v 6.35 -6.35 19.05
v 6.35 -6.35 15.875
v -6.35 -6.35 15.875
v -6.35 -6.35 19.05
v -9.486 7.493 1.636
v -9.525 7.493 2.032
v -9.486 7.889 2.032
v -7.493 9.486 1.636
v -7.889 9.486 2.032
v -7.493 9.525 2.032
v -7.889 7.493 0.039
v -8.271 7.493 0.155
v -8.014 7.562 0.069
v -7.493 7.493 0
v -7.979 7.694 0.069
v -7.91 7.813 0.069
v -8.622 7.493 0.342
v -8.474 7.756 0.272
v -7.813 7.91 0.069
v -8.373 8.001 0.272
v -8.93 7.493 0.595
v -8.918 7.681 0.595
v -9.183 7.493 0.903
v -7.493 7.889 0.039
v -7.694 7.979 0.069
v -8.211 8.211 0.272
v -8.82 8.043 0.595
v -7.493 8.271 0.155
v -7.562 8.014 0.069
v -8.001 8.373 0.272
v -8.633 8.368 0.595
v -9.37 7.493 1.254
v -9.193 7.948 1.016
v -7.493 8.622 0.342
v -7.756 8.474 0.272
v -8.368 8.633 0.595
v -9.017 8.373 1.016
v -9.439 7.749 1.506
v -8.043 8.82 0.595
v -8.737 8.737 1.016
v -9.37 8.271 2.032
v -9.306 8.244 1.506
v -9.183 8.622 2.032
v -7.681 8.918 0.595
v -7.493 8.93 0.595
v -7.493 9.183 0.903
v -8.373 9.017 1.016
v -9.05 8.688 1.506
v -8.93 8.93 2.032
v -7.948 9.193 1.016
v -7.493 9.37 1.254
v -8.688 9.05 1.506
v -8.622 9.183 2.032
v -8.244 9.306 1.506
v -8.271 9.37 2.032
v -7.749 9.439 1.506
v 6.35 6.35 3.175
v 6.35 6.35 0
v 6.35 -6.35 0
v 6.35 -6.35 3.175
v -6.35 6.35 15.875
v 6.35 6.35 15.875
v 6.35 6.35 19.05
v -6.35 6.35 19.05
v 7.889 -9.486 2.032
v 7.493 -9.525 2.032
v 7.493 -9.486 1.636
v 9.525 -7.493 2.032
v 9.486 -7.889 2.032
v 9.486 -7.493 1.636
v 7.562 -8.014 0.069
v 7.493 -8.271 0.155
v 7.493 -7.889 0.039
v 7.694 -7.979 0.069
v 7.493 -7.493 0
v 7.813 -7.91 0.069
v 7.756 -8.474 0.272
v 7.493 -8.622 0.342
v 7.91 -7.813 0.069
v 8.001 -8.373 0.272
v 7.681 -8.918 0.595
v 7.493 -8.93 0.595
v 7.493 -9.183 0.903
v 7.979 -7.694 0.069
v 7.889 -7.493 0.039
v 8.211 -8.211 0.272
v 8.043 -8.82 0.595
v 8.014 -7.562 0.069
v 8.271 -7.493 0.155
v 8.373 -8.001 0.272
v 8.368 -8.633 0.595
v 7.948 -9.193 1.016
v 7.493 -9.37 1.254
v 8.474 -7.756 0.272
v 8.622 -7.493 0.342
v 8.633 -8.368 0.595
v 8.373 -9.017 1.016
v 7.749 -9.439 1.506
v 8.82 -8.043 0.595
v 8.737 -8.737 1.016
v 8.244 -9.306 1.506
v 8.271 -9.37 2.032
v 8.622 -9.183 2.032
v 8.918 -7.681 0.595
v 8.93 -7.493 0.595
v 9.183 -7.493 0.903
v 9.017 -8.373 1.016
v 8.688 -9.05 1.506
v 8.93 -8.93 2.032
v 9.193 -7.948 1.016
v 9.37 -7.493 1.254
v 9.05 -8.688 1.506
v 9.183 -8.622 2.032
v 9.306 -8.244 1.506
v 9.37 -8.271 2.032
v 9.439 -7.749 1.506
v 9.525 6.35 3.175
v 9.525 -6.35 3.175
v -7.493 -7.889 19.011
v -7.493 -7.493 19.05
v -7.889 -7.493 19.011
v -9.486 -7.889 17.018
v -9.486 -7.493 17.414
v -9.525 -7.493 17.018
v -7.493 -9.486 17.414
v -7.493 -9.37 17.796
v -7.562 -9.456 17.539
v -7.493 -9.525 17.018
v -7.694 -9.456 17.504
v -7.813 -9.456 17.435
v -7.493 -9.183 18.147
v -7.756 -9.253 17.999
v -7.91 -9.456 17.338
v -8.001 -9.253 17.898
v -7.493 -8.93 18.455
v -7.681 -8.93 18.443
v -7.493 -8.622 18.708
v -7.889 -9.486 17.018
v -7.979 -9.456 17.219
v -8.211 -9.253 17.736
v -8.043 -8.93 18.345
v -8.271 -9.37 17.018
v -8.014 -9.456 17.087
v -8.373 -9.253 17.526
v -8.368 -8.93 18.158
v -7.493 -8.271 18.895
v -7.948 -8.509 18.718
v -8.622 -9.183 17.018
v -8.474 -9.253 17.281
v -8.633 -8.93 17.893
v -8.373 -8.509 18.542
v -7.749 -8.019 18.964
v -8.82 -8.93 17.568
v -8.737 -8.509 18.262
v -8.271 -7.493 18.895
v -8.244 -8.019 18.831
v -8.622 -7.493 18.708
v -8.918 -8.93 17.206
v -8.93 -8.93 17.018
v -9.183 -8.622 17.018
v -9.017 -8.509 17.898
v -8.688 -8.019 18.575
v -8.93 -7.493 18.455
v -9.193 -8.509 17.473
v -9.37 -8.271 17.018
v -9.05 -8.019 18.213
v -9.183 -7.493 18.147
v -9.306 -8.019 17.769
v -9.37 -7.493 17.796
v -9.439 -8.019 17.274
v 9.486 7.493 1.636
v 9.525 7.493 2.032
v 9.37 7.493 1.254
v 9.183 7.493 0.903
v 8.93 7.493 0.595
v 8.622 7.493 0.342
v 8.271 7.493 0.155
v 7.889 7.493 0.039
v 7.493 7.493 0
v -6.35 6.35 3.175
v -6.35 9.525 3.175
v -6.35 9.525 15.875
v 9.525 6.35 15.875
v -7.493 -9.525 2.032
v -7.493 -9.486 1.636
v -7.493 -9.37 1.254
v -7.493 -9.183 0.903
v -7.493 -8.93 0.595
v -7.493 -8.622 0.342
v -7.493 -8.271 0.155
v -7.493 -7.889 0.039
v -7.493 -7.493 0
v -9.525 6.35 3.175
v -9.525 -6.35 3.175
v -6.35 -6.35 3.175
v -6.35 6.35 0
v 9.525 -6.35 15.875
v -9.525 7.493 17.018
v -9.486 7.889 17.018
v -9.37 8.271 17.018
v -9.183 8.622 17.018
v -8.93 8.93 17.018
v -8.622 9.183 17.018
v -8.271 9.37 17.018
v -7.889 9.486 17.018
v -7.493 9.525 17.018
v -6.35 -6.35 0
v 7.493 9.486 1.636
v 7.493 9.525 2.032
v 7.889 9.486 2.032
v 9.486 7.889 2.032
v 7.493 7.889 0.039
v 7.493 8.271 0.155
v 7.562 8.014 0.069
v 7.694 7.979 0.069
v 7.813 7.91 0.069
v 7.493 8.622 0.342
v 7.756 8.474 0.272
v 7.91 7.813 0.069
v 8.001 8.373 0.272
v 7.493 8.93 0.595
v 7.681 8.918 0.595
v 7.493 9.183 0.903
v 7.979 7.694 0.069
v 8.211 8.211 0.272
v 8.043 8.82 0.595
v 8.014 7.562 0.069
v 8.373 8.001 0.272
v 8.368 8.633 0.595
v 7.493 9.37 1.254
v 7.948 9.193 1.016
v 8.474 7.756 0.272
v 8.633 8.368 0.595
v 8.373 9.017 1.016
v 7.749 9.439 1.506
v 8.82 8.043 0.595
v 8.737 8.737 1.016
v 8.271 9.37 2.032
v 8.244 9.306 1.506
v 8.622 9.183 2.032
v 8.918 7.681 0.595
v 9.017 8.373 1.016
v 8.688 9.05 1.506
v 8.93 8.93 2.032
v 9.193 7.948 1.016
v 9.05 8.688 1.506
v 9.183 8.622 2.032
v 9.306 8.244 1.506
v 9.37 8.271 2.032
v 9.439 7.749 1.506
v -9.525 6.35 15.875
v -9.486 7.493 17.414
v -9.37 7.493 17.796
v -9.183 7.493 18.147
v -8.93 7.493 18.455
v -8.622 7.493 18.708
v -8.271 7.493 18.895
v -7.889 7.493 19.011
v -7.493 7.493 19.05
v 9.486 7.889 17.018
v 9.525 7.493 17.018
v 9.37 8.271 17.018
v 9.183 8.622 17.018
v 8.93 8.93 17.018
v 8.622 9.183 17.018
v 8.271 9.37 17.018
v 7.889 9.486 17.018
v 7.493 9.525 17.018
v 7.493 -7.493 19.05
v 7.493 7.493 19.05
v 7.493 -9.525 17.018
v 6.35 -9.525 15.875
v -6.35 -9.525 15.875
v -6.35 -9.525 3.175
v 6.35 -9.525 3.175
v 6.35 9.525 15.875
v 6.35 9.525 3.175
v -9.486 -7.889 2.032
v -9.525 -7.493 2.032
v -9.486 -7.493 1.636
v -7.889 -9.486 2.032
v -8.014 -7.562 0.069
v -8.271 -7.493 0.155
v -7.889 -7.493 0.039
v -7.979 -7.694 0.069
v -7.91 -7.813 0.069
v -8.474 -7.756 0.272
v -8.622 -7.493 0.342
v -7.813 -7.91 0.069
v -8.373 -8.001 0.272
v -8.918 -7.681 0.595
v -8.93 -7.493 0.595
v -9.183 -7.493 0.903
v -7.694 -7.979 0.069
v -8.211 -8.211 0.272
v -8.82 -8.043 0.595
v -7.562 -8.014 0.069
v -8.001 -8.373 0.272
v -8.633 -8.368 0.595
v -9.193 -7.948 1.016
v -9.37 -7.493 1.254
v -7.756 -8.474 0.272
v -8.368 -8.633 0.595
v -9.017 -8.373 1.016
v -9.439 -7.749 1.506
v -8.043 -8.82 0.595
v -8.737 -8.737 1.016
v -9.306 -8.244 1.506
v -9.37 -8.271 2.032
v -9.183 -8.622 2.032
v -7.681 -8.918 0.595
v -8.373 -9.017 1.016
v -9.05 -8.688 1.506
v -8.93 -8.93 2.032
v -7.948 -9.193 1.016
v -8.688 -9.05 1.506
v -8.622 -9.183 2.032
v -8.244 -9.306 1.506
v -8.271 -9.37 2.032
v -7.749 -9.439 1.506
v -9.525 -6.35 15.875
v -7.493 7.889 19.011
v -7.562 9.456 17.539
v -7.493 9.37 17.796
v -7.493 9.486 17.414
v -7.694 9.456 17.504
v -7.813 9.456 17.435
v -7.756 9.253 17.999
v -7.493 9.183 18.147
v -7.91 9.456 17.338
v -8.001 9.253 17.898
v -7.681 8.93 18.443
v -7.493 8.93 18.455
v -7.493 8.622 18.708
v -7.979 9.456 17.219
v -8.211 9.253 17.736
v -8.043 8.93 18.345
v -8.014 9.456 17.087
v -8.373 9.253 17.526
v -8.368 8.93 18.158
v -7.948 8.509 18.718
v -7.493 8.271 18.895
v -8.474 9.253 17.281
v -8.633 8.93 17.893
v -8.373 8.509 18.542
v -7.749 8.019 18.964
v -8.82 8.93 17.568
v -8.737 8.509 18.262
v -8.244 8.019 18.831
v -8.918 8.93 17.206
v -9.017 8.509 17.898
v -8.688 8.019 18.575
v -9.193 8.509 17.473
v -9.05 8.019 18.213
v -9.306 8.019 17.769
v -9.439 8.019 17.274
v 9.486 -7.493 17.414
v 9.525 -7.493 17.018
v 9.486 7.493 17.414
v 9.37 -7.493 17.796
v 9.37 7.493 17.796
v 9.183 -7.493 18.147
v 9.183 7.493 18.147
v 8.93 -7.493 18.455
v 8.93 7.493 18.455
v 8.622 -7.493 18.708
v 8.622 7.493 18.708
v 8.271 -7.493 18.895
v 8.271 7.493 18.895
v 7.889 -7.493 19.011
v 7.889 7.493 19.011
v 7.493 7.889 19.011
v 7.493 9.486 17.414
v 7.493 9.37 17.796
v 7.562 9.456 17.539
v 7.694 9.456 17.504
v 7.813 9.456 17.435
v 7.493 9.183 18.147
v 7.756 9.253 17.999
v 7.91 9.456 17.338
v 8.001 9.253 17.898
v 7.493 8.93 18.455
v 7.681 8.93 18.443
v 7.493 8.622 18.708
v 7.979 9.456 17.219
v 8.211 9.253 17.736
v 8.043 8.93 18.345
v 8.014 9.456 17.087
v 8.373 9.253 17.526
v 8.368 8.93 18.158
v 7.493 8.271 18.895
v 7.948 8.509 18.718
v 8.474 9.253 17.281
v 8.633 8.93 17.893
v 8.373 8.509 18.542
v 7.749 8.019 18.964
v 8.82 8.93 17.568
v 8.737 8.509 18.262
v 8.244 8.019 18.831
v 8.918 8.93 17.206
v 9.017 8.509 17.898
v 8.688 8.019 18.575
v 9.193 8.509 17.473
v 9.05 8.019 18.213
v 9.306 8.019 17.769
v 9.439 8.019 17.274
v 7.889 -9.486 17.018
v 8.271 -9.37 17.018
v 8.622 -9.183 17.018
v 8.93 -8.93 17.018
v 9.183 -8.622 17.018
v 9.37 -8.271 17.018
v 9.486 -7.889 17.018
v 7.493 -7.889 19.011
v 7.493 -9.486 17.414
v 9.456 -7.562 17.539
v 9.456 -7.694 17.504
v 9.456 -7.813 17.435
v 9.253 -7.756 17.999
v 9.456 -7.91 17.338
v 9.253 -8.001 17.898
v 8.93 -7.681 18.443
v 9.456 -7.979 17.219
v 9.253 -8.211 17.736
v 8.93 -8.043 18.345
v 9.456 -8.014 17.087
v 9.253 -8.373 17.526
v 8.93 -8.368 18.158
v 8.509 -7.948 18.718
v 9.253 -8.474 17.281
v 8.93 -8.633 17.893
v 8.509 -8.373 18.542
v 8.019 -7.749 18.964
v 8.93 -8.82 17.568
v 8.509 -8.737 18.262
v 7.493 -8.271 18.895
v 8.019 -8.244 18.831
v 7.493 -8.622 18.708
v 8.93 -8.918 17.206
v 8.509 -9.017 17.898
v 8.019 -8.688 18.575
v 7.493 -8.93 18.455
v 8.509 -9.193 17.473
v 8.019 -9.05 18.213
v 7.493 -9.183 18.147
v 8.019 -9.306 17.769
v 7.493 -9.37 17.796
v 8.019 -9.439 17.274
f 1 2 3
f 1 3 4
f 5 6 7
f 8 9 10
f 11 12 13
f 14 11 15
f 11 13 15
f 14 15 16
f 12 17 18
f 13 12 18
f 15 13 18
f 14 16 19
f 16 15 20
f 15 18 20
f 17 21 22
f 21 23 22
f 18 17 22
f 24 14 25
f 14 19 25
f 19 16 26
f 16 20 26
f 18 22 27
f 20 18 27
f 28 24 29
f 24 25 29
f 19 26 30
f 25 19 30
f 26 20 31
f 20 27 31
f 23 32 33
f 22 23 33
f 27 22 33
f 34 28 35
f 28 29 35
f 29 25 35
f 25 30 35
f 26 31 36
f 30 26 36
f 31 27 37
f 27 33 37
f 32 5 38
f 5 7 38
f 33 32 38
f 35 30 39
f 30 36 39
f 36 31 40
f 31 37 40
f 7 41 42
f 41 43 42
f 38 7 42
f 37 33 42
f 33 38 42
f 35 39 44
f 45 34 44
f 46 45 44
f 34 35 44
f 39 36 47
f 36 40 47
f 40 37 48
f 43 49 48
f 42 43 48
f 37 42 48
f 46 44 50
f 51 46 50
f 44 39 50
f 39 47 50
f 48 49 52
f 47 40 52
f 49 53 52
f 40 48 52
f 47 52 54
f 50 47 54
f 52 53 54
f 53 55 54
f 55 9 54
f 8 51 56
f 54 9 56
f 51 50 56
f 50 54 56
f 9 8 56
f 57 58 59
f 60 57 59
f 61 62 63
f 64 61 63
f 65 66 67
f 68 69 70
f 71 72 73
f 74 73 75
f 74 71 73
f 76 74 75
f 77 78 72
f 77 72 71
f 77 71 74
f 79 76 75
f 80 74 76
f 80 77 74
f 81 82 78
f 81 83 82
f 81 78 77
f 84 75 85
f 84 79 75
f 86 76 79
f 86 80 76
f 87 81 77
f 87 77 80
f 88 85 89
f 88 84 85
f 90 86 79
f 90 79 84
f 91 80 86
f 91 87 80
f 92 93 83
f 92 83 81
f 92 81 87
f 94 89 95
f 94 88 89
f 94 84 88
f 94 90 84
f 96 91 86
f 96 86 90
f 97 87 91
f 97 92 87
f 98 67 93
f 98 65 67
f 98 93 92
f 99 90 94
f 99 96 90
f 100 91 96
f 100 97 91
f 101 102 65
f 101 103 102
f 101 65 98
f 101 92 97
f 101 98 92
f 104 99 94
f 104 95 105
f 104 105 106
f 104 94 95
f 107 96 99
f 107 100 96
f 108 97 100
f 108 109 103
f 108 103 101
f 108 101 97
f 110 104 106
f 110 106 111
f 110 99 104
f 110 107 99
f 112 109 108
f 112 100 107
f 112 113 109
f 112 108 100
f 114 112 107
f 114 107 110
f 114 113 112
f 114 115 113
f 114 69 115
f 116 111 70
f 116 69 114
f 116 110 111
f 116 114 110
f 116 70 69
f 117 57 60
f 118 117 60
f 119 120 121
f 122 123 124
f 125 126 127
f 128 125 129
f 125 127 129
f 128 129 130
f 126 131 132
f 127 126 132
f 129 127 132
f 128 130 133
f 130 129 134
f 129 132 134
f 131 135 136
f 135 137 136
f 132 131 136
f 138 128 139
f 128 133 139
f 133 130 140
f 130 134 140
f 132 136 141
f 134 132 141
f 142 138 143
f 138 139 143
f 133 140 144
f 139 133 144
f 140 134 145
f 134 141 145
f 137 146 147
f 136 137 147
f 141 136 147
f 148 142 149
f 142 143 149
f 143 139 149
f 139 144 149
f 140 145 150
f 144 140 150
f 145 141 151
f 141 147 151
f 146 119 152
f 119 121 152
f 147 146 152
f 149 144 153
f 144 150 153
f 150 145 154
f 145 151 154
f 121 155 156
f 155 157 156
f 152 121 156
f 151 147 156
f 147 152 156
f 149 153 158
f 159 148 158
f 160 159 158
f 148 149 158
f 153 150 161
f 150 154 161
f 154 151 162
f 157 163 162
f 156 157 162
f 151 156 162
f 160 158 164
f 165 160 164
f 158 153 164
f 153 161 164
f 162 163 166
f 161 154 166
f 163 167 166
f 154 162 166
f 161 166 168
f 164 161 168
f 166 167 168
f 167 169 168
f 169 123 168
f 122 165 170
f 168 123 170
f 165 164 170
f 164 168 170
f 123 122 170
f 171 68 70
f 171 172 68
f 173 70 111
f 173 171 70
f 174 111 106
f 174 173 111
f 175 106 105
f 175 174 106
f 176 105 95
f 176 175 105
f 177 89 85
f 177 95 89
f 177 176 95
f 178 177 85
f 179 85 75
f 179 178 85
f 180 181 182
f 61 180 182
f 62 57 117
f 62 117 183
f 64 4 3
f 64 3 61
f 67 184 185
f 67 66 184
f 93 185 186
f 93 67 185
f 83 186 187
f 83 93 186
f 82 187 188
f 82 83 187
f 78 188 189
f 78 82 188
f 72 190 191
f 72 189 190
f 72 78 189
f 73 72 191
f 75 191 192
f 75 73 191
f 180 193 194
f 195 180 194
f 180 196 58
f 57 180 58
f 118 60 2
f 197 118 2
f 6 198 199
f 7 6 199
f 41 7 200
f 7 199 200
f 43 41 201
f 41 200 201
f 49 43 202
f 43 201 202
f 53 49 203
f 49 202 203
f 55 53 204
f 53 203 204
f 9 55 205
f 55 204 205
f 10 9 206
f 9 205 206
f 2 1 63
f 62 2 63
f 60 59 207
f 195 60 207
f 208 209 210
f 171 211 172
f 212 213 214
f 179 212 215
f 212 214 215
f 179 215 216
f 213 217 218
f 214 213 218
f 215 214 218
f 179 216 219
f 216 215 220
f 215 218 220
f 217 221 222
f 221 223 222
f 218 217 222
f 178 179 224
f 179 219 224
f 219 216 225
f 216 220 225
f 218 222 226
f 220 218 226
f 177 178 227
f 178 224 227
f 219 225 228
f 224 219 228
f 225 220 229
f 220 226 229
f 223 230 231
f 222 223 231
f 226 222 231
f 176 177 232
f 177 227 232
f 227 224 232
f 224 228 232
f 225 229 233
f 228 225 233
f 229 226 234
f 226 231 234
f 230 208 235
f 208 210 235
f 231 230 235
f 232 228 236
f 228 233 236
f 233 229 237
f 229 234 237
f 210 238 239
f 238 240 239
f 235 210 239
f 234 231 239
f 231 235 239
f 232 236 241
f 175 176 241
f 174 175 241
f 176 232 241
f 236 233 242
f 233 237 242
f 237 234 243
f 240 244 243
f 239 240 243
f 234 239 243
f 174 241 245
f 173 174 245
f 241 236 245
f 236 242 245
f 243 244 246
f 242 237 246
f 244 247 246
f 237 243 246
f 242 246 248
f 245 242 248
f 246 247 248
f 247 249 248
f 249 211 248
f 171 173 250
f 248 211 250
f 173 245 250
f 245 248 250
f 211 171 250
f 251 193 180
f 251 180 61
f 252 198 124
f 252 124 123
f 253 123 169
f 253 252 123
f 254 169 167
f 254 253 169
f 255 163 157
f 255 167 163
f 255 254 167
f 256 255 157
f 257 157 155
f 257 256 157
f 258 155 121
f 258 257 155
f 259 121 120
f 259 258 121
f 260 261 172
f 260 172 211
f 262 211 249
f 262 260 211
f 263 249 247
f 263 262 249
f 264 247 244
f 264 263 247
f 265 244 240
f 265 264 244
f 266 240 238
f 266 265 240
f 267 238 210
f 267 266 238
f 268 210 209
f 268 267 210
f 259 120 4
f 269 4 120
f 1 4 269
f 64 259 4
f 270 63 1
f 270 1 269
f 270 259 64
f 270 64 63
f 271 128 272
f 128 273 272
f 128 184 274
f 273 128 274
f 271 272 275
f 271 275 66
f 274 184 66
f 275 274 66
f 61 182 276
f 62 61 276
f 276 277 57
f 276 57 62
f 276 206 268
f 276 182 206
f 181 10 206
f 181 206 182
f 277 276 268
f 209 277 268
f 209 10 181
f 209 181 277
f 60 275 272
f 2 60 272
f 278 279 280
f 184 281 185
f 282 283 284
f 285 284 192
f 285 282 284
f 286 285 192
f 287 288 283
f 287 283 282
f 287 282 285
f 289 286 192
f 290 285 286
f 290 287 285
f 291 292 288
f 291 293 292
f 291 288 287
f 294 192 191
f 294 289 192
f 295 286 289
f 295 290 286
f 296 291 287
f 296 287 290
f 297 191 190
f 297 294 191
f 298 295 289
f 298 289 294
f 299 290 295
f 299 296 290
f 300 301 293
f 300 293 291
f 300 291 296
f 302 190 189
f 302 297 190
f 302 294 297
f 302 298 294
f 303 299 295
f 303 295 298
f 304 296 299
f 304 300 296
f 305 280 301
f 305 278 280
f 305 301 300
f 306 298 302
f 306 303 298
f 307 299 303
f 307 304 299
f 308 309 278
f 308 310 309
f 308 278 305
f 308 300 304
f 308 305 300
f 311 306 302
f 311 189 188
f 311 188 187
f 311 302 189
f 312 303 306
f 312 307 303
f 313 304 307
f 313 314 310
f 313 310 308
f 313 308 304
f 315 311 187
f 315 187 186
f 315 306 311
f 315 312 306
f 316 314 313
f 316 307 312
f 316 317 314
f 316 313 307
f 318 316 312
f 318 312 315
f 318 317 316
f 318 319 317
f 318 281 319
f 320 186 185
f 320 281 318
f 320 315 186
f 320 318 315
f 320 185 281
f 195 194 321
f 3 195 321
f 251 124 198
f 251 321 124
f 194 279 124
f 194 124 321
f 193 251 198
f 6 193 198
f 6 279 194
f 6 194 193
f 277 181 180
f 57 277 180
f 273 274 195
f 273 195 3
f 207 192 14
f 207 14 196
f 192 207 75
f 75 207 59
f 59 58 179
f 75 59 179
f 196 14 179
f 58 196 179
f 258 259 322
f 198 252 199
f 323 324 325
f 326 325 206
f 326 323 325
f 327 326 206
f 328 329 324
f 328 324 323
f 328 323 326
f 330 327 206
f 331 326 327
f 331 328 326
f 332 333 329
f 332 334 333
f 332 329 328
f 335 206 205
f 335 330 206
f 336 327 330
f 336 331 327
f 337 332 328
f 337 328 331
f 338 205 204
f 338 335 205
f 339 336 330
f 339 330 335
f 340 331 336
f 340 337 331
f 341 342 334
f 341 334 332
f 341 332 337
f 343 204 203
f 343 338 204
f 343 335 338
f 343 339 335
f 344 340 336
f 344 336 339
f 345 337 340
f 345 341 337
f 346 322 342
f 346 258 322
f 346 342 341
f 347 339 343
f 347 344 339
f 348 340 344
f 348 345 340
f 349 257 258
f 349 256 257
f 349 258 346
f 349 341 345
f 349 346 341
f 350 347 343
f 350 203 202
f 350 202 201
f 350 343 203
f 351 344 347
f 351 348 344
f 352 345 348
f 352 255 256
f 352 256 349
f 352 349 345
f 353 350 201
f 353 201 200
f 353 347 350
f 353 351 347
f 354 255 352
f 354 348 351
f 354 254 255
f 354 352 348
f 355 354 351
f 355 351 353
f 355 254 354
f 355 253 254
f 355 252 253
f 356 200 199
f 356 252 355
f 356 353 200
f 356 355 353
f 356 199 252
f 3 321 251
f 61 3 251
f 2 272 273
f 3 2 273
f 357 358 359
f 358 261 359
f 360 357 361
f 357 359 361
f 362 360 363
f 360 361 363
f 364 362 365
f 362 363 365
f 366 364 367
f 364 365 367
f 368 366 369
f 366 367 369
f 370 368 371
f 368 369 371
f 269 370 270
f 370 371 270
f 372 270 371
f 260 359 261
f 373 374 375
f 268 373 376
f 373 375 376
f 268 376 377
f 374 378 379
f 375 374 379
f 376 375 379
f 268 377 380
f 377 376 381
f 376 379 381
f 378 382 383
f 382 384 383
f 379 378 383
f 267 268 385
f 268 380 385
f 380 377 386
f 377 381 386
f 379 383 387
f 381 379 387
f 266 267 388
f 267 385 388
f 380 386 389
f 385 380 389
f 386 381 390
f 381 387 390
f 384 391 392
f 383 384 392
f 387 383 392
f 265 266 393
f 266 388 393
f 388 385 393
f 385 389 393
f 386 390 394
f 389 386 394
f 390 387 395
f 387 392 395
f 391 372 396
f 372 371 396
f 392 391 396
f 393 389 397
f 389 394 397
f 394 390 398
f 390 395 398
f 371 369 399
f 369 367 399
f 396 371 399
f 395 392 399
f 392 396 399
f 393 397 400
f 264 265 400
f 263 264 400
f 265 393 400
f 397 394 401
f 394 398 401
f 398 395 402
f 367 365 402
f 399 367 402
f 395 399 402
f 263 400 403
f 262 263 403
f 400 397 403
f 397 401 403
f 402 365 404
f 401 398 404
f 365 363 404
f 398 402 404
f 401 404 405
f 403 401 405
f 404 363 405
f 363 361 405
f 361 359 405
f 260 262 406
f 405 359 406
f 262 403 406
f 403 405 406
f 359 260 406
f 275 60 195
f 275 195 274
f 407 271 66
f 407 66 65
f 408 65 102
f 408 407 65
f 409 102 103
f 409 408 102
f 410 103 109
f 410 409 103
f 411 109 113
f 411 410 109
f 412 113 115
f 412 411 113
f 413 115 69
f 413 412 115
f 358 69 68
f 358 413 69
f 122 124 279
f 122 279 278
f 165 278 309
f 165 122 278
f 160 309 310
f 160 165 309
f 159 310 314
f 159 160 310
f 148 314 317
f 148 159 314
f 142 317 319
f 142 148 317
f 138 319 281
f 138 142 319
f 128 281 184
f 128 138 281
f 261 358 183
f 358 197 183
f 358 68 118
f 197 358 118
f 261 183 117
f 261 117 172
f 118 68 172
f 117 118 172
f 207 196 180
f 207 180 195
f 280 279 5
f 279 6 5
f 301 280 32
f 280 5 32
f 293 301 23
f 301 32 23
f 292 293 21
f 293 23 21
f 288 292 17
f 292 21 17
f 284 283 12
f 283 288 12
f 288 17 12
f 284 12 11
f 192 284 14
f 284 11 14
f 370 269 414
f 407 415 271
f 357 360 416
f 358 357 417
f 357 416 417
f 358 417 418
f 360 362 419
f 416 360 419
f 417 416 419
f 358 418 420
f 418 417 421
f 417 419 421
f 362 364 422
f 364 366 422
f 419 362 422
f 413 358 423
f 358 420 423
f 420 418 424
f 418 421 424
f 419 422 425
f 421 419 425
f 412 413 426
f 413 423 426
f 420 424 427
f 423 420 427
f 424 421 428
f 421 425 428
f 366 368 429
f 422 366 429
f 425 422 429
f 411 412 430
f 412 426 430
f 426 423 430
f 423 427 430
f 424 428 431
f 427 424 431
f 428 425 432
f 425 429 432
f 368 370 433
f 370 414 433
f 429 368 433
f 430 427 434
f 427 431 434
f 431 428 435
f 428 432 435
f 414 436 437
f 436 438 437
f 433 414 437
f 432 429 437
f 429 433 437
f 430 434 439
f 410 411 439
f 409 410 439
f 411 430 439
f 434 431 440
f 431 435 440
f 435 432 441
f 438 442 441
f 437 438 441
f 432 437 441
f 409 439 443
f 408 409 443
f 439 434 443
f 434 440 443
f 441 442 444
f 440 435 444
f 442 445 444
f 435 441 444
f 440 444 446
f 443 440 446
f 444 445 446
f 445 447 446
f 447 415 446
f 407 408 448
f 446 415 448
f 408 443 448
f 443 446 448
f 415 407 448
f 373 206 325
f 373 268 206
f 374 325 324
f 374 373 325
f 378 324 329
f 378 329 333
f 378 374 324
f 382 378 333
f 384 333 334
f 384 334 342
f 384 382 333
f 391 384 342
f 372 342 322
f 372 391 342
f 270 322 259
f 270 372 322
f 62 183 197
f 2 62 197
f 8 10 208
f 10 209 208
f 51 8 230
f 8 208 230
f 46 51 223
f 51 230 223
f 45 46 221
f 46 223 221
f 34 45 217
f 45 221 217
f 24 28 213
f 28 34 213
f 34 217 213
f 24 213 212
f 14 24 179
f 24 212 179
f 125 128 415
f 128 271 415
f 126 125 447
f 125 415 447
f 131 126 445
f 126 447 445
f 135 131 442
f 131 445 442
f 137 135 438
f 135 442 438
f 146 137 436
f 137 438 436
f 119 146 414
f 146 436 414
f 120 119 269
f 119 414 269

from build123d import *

# Parameters (mm, degrees)
F0_W      = 19.05
F0_H      = 19.05
F1_DEPTH  = 19.05
F2_R      = 2.032
F3_W      = 12.7
F3_H      = 12.7
F4_DEPTH  = 3.302
F5_W      = 6.35
F5_H      = 12.7
F6_DEPTH  = 3.302
F7_W      = 6.35
F7_H      = 12.7
F8_DEPTH  = 3.302
F9_W      = 6.35
F9_H      = 12.7
F10_DEPTH = 3.302
F11_W     = 6.35
F11_H     = 12.7
F12_DEPTH = 3.302
F13_W     = 6.35
F13_H     = 12.7
F14_DEPTH = 41.148


with BuildPart() as f1:
    # F0 (on Top) → F1 (new body)
    with BuildSketch(Plane.XY):
        Rectangle(F0_W, F0_H)
    extrude(amount=F1_DEPTH)

    # F2
    f2_edges = [f1.edges().sort_by_distance(p)[0] for p in [
        (-9.525, 0, 19.05),
        (0, -9.525, 19.05),
        (9.525, 0, 19.05),
        (0, 9.525, 19.05),
        (-9.525, 9.525, 9.525),
        (-9.525, -9.525, 9.525),
        (-9.525, 0, 0),
        (9.525, 9.525, 9.525),
        (0, 9.525, 0),
        (9.525, -9.525, 9.525),
        (0, -9.525, 0),
        (9.525, 0, 0),
    ]]
    fillet(f2_edges, radius=F2_R)

    # F3 (on face) → F4 (cut)
    with BuildSketch(Plane.XY.offset(19.05)):
        Rectangle(F3_W, F3_H)
    extrude(amount=-F4_DEPTH, mode=Mode.SUBTRACT)

    # F5 (on face) → F6 (cut)
    with BuildSketch(Plane(origin=(-9.525, 0, 0), x_dir=(0, -1, 0), z_dir=(-1, 0, 0))):
        with Locations((3.175, 9.525)):
            Rectangle(F5_W, F5_H)
        with Locations((-3.175, 9.525)):
            Rectangle(F5_W, F5_H)
    extrude(amount=-F6_DEPTH, mode=Mode.SUBTRACT)

    # F7 (on face) → F8 (cut)
    with BuildSketch(Plane.YZ.offset(9.525)):
        with Locations((3.175, 9.525)):
            Rectangle(F7_W, F7_H)
        with Locations((-3.175, 9.525)):
            Rectangle(F7_W, F7_H)
    extrude(amount=-F8_DEPTH, mode=Mode.SUBTRACT)

    # F9 (on face) → F10 (cut)
    with BuildSketch(Plane.XZ.offset(9.525)):
        with Locations((3.175, 9.525)):
            Rectangle(F9_W, F9_H)
        with Locations((-3.175, 9.525)):
            Rectangle(F9_W, F9_H)
    extrude(amount=-F10_DEPTH, mode=Mode.SUBTRACT)

    # F11 (on face) → F12 (cut)
    with BuildSketch(Plane(origin=(0, 9.525, 0), x_dir=(-1, 0, 0), z_dir=(0, 1, 0))):
        with Locations((-3.175, 9.525)):
            Rectangle(F11_W, F11_H)
        with Locations((3.175, 9.525)):
            Rectangle(F11_W, F11_H)
    extrude(amount=-F12_DEPTH, mode=Mode.SUBTRACT)

    # F13 (on face) → F14 (cut)
    with BuildSketch(Plane(origin=(0, 0, 0), x_dir=(1, 0, 0), z_dir=(0, 0, -1))):
        with Locations((3.175, 0)):
            Rectangle(F13_W, F13_H)
        with Locations((-3.175, 0)):
            Rectangle(F13_W, F13_H)
    extrude(amount=-F14_DEPTH, mode=Mode.SUBTRACT)


solid = f1.part
